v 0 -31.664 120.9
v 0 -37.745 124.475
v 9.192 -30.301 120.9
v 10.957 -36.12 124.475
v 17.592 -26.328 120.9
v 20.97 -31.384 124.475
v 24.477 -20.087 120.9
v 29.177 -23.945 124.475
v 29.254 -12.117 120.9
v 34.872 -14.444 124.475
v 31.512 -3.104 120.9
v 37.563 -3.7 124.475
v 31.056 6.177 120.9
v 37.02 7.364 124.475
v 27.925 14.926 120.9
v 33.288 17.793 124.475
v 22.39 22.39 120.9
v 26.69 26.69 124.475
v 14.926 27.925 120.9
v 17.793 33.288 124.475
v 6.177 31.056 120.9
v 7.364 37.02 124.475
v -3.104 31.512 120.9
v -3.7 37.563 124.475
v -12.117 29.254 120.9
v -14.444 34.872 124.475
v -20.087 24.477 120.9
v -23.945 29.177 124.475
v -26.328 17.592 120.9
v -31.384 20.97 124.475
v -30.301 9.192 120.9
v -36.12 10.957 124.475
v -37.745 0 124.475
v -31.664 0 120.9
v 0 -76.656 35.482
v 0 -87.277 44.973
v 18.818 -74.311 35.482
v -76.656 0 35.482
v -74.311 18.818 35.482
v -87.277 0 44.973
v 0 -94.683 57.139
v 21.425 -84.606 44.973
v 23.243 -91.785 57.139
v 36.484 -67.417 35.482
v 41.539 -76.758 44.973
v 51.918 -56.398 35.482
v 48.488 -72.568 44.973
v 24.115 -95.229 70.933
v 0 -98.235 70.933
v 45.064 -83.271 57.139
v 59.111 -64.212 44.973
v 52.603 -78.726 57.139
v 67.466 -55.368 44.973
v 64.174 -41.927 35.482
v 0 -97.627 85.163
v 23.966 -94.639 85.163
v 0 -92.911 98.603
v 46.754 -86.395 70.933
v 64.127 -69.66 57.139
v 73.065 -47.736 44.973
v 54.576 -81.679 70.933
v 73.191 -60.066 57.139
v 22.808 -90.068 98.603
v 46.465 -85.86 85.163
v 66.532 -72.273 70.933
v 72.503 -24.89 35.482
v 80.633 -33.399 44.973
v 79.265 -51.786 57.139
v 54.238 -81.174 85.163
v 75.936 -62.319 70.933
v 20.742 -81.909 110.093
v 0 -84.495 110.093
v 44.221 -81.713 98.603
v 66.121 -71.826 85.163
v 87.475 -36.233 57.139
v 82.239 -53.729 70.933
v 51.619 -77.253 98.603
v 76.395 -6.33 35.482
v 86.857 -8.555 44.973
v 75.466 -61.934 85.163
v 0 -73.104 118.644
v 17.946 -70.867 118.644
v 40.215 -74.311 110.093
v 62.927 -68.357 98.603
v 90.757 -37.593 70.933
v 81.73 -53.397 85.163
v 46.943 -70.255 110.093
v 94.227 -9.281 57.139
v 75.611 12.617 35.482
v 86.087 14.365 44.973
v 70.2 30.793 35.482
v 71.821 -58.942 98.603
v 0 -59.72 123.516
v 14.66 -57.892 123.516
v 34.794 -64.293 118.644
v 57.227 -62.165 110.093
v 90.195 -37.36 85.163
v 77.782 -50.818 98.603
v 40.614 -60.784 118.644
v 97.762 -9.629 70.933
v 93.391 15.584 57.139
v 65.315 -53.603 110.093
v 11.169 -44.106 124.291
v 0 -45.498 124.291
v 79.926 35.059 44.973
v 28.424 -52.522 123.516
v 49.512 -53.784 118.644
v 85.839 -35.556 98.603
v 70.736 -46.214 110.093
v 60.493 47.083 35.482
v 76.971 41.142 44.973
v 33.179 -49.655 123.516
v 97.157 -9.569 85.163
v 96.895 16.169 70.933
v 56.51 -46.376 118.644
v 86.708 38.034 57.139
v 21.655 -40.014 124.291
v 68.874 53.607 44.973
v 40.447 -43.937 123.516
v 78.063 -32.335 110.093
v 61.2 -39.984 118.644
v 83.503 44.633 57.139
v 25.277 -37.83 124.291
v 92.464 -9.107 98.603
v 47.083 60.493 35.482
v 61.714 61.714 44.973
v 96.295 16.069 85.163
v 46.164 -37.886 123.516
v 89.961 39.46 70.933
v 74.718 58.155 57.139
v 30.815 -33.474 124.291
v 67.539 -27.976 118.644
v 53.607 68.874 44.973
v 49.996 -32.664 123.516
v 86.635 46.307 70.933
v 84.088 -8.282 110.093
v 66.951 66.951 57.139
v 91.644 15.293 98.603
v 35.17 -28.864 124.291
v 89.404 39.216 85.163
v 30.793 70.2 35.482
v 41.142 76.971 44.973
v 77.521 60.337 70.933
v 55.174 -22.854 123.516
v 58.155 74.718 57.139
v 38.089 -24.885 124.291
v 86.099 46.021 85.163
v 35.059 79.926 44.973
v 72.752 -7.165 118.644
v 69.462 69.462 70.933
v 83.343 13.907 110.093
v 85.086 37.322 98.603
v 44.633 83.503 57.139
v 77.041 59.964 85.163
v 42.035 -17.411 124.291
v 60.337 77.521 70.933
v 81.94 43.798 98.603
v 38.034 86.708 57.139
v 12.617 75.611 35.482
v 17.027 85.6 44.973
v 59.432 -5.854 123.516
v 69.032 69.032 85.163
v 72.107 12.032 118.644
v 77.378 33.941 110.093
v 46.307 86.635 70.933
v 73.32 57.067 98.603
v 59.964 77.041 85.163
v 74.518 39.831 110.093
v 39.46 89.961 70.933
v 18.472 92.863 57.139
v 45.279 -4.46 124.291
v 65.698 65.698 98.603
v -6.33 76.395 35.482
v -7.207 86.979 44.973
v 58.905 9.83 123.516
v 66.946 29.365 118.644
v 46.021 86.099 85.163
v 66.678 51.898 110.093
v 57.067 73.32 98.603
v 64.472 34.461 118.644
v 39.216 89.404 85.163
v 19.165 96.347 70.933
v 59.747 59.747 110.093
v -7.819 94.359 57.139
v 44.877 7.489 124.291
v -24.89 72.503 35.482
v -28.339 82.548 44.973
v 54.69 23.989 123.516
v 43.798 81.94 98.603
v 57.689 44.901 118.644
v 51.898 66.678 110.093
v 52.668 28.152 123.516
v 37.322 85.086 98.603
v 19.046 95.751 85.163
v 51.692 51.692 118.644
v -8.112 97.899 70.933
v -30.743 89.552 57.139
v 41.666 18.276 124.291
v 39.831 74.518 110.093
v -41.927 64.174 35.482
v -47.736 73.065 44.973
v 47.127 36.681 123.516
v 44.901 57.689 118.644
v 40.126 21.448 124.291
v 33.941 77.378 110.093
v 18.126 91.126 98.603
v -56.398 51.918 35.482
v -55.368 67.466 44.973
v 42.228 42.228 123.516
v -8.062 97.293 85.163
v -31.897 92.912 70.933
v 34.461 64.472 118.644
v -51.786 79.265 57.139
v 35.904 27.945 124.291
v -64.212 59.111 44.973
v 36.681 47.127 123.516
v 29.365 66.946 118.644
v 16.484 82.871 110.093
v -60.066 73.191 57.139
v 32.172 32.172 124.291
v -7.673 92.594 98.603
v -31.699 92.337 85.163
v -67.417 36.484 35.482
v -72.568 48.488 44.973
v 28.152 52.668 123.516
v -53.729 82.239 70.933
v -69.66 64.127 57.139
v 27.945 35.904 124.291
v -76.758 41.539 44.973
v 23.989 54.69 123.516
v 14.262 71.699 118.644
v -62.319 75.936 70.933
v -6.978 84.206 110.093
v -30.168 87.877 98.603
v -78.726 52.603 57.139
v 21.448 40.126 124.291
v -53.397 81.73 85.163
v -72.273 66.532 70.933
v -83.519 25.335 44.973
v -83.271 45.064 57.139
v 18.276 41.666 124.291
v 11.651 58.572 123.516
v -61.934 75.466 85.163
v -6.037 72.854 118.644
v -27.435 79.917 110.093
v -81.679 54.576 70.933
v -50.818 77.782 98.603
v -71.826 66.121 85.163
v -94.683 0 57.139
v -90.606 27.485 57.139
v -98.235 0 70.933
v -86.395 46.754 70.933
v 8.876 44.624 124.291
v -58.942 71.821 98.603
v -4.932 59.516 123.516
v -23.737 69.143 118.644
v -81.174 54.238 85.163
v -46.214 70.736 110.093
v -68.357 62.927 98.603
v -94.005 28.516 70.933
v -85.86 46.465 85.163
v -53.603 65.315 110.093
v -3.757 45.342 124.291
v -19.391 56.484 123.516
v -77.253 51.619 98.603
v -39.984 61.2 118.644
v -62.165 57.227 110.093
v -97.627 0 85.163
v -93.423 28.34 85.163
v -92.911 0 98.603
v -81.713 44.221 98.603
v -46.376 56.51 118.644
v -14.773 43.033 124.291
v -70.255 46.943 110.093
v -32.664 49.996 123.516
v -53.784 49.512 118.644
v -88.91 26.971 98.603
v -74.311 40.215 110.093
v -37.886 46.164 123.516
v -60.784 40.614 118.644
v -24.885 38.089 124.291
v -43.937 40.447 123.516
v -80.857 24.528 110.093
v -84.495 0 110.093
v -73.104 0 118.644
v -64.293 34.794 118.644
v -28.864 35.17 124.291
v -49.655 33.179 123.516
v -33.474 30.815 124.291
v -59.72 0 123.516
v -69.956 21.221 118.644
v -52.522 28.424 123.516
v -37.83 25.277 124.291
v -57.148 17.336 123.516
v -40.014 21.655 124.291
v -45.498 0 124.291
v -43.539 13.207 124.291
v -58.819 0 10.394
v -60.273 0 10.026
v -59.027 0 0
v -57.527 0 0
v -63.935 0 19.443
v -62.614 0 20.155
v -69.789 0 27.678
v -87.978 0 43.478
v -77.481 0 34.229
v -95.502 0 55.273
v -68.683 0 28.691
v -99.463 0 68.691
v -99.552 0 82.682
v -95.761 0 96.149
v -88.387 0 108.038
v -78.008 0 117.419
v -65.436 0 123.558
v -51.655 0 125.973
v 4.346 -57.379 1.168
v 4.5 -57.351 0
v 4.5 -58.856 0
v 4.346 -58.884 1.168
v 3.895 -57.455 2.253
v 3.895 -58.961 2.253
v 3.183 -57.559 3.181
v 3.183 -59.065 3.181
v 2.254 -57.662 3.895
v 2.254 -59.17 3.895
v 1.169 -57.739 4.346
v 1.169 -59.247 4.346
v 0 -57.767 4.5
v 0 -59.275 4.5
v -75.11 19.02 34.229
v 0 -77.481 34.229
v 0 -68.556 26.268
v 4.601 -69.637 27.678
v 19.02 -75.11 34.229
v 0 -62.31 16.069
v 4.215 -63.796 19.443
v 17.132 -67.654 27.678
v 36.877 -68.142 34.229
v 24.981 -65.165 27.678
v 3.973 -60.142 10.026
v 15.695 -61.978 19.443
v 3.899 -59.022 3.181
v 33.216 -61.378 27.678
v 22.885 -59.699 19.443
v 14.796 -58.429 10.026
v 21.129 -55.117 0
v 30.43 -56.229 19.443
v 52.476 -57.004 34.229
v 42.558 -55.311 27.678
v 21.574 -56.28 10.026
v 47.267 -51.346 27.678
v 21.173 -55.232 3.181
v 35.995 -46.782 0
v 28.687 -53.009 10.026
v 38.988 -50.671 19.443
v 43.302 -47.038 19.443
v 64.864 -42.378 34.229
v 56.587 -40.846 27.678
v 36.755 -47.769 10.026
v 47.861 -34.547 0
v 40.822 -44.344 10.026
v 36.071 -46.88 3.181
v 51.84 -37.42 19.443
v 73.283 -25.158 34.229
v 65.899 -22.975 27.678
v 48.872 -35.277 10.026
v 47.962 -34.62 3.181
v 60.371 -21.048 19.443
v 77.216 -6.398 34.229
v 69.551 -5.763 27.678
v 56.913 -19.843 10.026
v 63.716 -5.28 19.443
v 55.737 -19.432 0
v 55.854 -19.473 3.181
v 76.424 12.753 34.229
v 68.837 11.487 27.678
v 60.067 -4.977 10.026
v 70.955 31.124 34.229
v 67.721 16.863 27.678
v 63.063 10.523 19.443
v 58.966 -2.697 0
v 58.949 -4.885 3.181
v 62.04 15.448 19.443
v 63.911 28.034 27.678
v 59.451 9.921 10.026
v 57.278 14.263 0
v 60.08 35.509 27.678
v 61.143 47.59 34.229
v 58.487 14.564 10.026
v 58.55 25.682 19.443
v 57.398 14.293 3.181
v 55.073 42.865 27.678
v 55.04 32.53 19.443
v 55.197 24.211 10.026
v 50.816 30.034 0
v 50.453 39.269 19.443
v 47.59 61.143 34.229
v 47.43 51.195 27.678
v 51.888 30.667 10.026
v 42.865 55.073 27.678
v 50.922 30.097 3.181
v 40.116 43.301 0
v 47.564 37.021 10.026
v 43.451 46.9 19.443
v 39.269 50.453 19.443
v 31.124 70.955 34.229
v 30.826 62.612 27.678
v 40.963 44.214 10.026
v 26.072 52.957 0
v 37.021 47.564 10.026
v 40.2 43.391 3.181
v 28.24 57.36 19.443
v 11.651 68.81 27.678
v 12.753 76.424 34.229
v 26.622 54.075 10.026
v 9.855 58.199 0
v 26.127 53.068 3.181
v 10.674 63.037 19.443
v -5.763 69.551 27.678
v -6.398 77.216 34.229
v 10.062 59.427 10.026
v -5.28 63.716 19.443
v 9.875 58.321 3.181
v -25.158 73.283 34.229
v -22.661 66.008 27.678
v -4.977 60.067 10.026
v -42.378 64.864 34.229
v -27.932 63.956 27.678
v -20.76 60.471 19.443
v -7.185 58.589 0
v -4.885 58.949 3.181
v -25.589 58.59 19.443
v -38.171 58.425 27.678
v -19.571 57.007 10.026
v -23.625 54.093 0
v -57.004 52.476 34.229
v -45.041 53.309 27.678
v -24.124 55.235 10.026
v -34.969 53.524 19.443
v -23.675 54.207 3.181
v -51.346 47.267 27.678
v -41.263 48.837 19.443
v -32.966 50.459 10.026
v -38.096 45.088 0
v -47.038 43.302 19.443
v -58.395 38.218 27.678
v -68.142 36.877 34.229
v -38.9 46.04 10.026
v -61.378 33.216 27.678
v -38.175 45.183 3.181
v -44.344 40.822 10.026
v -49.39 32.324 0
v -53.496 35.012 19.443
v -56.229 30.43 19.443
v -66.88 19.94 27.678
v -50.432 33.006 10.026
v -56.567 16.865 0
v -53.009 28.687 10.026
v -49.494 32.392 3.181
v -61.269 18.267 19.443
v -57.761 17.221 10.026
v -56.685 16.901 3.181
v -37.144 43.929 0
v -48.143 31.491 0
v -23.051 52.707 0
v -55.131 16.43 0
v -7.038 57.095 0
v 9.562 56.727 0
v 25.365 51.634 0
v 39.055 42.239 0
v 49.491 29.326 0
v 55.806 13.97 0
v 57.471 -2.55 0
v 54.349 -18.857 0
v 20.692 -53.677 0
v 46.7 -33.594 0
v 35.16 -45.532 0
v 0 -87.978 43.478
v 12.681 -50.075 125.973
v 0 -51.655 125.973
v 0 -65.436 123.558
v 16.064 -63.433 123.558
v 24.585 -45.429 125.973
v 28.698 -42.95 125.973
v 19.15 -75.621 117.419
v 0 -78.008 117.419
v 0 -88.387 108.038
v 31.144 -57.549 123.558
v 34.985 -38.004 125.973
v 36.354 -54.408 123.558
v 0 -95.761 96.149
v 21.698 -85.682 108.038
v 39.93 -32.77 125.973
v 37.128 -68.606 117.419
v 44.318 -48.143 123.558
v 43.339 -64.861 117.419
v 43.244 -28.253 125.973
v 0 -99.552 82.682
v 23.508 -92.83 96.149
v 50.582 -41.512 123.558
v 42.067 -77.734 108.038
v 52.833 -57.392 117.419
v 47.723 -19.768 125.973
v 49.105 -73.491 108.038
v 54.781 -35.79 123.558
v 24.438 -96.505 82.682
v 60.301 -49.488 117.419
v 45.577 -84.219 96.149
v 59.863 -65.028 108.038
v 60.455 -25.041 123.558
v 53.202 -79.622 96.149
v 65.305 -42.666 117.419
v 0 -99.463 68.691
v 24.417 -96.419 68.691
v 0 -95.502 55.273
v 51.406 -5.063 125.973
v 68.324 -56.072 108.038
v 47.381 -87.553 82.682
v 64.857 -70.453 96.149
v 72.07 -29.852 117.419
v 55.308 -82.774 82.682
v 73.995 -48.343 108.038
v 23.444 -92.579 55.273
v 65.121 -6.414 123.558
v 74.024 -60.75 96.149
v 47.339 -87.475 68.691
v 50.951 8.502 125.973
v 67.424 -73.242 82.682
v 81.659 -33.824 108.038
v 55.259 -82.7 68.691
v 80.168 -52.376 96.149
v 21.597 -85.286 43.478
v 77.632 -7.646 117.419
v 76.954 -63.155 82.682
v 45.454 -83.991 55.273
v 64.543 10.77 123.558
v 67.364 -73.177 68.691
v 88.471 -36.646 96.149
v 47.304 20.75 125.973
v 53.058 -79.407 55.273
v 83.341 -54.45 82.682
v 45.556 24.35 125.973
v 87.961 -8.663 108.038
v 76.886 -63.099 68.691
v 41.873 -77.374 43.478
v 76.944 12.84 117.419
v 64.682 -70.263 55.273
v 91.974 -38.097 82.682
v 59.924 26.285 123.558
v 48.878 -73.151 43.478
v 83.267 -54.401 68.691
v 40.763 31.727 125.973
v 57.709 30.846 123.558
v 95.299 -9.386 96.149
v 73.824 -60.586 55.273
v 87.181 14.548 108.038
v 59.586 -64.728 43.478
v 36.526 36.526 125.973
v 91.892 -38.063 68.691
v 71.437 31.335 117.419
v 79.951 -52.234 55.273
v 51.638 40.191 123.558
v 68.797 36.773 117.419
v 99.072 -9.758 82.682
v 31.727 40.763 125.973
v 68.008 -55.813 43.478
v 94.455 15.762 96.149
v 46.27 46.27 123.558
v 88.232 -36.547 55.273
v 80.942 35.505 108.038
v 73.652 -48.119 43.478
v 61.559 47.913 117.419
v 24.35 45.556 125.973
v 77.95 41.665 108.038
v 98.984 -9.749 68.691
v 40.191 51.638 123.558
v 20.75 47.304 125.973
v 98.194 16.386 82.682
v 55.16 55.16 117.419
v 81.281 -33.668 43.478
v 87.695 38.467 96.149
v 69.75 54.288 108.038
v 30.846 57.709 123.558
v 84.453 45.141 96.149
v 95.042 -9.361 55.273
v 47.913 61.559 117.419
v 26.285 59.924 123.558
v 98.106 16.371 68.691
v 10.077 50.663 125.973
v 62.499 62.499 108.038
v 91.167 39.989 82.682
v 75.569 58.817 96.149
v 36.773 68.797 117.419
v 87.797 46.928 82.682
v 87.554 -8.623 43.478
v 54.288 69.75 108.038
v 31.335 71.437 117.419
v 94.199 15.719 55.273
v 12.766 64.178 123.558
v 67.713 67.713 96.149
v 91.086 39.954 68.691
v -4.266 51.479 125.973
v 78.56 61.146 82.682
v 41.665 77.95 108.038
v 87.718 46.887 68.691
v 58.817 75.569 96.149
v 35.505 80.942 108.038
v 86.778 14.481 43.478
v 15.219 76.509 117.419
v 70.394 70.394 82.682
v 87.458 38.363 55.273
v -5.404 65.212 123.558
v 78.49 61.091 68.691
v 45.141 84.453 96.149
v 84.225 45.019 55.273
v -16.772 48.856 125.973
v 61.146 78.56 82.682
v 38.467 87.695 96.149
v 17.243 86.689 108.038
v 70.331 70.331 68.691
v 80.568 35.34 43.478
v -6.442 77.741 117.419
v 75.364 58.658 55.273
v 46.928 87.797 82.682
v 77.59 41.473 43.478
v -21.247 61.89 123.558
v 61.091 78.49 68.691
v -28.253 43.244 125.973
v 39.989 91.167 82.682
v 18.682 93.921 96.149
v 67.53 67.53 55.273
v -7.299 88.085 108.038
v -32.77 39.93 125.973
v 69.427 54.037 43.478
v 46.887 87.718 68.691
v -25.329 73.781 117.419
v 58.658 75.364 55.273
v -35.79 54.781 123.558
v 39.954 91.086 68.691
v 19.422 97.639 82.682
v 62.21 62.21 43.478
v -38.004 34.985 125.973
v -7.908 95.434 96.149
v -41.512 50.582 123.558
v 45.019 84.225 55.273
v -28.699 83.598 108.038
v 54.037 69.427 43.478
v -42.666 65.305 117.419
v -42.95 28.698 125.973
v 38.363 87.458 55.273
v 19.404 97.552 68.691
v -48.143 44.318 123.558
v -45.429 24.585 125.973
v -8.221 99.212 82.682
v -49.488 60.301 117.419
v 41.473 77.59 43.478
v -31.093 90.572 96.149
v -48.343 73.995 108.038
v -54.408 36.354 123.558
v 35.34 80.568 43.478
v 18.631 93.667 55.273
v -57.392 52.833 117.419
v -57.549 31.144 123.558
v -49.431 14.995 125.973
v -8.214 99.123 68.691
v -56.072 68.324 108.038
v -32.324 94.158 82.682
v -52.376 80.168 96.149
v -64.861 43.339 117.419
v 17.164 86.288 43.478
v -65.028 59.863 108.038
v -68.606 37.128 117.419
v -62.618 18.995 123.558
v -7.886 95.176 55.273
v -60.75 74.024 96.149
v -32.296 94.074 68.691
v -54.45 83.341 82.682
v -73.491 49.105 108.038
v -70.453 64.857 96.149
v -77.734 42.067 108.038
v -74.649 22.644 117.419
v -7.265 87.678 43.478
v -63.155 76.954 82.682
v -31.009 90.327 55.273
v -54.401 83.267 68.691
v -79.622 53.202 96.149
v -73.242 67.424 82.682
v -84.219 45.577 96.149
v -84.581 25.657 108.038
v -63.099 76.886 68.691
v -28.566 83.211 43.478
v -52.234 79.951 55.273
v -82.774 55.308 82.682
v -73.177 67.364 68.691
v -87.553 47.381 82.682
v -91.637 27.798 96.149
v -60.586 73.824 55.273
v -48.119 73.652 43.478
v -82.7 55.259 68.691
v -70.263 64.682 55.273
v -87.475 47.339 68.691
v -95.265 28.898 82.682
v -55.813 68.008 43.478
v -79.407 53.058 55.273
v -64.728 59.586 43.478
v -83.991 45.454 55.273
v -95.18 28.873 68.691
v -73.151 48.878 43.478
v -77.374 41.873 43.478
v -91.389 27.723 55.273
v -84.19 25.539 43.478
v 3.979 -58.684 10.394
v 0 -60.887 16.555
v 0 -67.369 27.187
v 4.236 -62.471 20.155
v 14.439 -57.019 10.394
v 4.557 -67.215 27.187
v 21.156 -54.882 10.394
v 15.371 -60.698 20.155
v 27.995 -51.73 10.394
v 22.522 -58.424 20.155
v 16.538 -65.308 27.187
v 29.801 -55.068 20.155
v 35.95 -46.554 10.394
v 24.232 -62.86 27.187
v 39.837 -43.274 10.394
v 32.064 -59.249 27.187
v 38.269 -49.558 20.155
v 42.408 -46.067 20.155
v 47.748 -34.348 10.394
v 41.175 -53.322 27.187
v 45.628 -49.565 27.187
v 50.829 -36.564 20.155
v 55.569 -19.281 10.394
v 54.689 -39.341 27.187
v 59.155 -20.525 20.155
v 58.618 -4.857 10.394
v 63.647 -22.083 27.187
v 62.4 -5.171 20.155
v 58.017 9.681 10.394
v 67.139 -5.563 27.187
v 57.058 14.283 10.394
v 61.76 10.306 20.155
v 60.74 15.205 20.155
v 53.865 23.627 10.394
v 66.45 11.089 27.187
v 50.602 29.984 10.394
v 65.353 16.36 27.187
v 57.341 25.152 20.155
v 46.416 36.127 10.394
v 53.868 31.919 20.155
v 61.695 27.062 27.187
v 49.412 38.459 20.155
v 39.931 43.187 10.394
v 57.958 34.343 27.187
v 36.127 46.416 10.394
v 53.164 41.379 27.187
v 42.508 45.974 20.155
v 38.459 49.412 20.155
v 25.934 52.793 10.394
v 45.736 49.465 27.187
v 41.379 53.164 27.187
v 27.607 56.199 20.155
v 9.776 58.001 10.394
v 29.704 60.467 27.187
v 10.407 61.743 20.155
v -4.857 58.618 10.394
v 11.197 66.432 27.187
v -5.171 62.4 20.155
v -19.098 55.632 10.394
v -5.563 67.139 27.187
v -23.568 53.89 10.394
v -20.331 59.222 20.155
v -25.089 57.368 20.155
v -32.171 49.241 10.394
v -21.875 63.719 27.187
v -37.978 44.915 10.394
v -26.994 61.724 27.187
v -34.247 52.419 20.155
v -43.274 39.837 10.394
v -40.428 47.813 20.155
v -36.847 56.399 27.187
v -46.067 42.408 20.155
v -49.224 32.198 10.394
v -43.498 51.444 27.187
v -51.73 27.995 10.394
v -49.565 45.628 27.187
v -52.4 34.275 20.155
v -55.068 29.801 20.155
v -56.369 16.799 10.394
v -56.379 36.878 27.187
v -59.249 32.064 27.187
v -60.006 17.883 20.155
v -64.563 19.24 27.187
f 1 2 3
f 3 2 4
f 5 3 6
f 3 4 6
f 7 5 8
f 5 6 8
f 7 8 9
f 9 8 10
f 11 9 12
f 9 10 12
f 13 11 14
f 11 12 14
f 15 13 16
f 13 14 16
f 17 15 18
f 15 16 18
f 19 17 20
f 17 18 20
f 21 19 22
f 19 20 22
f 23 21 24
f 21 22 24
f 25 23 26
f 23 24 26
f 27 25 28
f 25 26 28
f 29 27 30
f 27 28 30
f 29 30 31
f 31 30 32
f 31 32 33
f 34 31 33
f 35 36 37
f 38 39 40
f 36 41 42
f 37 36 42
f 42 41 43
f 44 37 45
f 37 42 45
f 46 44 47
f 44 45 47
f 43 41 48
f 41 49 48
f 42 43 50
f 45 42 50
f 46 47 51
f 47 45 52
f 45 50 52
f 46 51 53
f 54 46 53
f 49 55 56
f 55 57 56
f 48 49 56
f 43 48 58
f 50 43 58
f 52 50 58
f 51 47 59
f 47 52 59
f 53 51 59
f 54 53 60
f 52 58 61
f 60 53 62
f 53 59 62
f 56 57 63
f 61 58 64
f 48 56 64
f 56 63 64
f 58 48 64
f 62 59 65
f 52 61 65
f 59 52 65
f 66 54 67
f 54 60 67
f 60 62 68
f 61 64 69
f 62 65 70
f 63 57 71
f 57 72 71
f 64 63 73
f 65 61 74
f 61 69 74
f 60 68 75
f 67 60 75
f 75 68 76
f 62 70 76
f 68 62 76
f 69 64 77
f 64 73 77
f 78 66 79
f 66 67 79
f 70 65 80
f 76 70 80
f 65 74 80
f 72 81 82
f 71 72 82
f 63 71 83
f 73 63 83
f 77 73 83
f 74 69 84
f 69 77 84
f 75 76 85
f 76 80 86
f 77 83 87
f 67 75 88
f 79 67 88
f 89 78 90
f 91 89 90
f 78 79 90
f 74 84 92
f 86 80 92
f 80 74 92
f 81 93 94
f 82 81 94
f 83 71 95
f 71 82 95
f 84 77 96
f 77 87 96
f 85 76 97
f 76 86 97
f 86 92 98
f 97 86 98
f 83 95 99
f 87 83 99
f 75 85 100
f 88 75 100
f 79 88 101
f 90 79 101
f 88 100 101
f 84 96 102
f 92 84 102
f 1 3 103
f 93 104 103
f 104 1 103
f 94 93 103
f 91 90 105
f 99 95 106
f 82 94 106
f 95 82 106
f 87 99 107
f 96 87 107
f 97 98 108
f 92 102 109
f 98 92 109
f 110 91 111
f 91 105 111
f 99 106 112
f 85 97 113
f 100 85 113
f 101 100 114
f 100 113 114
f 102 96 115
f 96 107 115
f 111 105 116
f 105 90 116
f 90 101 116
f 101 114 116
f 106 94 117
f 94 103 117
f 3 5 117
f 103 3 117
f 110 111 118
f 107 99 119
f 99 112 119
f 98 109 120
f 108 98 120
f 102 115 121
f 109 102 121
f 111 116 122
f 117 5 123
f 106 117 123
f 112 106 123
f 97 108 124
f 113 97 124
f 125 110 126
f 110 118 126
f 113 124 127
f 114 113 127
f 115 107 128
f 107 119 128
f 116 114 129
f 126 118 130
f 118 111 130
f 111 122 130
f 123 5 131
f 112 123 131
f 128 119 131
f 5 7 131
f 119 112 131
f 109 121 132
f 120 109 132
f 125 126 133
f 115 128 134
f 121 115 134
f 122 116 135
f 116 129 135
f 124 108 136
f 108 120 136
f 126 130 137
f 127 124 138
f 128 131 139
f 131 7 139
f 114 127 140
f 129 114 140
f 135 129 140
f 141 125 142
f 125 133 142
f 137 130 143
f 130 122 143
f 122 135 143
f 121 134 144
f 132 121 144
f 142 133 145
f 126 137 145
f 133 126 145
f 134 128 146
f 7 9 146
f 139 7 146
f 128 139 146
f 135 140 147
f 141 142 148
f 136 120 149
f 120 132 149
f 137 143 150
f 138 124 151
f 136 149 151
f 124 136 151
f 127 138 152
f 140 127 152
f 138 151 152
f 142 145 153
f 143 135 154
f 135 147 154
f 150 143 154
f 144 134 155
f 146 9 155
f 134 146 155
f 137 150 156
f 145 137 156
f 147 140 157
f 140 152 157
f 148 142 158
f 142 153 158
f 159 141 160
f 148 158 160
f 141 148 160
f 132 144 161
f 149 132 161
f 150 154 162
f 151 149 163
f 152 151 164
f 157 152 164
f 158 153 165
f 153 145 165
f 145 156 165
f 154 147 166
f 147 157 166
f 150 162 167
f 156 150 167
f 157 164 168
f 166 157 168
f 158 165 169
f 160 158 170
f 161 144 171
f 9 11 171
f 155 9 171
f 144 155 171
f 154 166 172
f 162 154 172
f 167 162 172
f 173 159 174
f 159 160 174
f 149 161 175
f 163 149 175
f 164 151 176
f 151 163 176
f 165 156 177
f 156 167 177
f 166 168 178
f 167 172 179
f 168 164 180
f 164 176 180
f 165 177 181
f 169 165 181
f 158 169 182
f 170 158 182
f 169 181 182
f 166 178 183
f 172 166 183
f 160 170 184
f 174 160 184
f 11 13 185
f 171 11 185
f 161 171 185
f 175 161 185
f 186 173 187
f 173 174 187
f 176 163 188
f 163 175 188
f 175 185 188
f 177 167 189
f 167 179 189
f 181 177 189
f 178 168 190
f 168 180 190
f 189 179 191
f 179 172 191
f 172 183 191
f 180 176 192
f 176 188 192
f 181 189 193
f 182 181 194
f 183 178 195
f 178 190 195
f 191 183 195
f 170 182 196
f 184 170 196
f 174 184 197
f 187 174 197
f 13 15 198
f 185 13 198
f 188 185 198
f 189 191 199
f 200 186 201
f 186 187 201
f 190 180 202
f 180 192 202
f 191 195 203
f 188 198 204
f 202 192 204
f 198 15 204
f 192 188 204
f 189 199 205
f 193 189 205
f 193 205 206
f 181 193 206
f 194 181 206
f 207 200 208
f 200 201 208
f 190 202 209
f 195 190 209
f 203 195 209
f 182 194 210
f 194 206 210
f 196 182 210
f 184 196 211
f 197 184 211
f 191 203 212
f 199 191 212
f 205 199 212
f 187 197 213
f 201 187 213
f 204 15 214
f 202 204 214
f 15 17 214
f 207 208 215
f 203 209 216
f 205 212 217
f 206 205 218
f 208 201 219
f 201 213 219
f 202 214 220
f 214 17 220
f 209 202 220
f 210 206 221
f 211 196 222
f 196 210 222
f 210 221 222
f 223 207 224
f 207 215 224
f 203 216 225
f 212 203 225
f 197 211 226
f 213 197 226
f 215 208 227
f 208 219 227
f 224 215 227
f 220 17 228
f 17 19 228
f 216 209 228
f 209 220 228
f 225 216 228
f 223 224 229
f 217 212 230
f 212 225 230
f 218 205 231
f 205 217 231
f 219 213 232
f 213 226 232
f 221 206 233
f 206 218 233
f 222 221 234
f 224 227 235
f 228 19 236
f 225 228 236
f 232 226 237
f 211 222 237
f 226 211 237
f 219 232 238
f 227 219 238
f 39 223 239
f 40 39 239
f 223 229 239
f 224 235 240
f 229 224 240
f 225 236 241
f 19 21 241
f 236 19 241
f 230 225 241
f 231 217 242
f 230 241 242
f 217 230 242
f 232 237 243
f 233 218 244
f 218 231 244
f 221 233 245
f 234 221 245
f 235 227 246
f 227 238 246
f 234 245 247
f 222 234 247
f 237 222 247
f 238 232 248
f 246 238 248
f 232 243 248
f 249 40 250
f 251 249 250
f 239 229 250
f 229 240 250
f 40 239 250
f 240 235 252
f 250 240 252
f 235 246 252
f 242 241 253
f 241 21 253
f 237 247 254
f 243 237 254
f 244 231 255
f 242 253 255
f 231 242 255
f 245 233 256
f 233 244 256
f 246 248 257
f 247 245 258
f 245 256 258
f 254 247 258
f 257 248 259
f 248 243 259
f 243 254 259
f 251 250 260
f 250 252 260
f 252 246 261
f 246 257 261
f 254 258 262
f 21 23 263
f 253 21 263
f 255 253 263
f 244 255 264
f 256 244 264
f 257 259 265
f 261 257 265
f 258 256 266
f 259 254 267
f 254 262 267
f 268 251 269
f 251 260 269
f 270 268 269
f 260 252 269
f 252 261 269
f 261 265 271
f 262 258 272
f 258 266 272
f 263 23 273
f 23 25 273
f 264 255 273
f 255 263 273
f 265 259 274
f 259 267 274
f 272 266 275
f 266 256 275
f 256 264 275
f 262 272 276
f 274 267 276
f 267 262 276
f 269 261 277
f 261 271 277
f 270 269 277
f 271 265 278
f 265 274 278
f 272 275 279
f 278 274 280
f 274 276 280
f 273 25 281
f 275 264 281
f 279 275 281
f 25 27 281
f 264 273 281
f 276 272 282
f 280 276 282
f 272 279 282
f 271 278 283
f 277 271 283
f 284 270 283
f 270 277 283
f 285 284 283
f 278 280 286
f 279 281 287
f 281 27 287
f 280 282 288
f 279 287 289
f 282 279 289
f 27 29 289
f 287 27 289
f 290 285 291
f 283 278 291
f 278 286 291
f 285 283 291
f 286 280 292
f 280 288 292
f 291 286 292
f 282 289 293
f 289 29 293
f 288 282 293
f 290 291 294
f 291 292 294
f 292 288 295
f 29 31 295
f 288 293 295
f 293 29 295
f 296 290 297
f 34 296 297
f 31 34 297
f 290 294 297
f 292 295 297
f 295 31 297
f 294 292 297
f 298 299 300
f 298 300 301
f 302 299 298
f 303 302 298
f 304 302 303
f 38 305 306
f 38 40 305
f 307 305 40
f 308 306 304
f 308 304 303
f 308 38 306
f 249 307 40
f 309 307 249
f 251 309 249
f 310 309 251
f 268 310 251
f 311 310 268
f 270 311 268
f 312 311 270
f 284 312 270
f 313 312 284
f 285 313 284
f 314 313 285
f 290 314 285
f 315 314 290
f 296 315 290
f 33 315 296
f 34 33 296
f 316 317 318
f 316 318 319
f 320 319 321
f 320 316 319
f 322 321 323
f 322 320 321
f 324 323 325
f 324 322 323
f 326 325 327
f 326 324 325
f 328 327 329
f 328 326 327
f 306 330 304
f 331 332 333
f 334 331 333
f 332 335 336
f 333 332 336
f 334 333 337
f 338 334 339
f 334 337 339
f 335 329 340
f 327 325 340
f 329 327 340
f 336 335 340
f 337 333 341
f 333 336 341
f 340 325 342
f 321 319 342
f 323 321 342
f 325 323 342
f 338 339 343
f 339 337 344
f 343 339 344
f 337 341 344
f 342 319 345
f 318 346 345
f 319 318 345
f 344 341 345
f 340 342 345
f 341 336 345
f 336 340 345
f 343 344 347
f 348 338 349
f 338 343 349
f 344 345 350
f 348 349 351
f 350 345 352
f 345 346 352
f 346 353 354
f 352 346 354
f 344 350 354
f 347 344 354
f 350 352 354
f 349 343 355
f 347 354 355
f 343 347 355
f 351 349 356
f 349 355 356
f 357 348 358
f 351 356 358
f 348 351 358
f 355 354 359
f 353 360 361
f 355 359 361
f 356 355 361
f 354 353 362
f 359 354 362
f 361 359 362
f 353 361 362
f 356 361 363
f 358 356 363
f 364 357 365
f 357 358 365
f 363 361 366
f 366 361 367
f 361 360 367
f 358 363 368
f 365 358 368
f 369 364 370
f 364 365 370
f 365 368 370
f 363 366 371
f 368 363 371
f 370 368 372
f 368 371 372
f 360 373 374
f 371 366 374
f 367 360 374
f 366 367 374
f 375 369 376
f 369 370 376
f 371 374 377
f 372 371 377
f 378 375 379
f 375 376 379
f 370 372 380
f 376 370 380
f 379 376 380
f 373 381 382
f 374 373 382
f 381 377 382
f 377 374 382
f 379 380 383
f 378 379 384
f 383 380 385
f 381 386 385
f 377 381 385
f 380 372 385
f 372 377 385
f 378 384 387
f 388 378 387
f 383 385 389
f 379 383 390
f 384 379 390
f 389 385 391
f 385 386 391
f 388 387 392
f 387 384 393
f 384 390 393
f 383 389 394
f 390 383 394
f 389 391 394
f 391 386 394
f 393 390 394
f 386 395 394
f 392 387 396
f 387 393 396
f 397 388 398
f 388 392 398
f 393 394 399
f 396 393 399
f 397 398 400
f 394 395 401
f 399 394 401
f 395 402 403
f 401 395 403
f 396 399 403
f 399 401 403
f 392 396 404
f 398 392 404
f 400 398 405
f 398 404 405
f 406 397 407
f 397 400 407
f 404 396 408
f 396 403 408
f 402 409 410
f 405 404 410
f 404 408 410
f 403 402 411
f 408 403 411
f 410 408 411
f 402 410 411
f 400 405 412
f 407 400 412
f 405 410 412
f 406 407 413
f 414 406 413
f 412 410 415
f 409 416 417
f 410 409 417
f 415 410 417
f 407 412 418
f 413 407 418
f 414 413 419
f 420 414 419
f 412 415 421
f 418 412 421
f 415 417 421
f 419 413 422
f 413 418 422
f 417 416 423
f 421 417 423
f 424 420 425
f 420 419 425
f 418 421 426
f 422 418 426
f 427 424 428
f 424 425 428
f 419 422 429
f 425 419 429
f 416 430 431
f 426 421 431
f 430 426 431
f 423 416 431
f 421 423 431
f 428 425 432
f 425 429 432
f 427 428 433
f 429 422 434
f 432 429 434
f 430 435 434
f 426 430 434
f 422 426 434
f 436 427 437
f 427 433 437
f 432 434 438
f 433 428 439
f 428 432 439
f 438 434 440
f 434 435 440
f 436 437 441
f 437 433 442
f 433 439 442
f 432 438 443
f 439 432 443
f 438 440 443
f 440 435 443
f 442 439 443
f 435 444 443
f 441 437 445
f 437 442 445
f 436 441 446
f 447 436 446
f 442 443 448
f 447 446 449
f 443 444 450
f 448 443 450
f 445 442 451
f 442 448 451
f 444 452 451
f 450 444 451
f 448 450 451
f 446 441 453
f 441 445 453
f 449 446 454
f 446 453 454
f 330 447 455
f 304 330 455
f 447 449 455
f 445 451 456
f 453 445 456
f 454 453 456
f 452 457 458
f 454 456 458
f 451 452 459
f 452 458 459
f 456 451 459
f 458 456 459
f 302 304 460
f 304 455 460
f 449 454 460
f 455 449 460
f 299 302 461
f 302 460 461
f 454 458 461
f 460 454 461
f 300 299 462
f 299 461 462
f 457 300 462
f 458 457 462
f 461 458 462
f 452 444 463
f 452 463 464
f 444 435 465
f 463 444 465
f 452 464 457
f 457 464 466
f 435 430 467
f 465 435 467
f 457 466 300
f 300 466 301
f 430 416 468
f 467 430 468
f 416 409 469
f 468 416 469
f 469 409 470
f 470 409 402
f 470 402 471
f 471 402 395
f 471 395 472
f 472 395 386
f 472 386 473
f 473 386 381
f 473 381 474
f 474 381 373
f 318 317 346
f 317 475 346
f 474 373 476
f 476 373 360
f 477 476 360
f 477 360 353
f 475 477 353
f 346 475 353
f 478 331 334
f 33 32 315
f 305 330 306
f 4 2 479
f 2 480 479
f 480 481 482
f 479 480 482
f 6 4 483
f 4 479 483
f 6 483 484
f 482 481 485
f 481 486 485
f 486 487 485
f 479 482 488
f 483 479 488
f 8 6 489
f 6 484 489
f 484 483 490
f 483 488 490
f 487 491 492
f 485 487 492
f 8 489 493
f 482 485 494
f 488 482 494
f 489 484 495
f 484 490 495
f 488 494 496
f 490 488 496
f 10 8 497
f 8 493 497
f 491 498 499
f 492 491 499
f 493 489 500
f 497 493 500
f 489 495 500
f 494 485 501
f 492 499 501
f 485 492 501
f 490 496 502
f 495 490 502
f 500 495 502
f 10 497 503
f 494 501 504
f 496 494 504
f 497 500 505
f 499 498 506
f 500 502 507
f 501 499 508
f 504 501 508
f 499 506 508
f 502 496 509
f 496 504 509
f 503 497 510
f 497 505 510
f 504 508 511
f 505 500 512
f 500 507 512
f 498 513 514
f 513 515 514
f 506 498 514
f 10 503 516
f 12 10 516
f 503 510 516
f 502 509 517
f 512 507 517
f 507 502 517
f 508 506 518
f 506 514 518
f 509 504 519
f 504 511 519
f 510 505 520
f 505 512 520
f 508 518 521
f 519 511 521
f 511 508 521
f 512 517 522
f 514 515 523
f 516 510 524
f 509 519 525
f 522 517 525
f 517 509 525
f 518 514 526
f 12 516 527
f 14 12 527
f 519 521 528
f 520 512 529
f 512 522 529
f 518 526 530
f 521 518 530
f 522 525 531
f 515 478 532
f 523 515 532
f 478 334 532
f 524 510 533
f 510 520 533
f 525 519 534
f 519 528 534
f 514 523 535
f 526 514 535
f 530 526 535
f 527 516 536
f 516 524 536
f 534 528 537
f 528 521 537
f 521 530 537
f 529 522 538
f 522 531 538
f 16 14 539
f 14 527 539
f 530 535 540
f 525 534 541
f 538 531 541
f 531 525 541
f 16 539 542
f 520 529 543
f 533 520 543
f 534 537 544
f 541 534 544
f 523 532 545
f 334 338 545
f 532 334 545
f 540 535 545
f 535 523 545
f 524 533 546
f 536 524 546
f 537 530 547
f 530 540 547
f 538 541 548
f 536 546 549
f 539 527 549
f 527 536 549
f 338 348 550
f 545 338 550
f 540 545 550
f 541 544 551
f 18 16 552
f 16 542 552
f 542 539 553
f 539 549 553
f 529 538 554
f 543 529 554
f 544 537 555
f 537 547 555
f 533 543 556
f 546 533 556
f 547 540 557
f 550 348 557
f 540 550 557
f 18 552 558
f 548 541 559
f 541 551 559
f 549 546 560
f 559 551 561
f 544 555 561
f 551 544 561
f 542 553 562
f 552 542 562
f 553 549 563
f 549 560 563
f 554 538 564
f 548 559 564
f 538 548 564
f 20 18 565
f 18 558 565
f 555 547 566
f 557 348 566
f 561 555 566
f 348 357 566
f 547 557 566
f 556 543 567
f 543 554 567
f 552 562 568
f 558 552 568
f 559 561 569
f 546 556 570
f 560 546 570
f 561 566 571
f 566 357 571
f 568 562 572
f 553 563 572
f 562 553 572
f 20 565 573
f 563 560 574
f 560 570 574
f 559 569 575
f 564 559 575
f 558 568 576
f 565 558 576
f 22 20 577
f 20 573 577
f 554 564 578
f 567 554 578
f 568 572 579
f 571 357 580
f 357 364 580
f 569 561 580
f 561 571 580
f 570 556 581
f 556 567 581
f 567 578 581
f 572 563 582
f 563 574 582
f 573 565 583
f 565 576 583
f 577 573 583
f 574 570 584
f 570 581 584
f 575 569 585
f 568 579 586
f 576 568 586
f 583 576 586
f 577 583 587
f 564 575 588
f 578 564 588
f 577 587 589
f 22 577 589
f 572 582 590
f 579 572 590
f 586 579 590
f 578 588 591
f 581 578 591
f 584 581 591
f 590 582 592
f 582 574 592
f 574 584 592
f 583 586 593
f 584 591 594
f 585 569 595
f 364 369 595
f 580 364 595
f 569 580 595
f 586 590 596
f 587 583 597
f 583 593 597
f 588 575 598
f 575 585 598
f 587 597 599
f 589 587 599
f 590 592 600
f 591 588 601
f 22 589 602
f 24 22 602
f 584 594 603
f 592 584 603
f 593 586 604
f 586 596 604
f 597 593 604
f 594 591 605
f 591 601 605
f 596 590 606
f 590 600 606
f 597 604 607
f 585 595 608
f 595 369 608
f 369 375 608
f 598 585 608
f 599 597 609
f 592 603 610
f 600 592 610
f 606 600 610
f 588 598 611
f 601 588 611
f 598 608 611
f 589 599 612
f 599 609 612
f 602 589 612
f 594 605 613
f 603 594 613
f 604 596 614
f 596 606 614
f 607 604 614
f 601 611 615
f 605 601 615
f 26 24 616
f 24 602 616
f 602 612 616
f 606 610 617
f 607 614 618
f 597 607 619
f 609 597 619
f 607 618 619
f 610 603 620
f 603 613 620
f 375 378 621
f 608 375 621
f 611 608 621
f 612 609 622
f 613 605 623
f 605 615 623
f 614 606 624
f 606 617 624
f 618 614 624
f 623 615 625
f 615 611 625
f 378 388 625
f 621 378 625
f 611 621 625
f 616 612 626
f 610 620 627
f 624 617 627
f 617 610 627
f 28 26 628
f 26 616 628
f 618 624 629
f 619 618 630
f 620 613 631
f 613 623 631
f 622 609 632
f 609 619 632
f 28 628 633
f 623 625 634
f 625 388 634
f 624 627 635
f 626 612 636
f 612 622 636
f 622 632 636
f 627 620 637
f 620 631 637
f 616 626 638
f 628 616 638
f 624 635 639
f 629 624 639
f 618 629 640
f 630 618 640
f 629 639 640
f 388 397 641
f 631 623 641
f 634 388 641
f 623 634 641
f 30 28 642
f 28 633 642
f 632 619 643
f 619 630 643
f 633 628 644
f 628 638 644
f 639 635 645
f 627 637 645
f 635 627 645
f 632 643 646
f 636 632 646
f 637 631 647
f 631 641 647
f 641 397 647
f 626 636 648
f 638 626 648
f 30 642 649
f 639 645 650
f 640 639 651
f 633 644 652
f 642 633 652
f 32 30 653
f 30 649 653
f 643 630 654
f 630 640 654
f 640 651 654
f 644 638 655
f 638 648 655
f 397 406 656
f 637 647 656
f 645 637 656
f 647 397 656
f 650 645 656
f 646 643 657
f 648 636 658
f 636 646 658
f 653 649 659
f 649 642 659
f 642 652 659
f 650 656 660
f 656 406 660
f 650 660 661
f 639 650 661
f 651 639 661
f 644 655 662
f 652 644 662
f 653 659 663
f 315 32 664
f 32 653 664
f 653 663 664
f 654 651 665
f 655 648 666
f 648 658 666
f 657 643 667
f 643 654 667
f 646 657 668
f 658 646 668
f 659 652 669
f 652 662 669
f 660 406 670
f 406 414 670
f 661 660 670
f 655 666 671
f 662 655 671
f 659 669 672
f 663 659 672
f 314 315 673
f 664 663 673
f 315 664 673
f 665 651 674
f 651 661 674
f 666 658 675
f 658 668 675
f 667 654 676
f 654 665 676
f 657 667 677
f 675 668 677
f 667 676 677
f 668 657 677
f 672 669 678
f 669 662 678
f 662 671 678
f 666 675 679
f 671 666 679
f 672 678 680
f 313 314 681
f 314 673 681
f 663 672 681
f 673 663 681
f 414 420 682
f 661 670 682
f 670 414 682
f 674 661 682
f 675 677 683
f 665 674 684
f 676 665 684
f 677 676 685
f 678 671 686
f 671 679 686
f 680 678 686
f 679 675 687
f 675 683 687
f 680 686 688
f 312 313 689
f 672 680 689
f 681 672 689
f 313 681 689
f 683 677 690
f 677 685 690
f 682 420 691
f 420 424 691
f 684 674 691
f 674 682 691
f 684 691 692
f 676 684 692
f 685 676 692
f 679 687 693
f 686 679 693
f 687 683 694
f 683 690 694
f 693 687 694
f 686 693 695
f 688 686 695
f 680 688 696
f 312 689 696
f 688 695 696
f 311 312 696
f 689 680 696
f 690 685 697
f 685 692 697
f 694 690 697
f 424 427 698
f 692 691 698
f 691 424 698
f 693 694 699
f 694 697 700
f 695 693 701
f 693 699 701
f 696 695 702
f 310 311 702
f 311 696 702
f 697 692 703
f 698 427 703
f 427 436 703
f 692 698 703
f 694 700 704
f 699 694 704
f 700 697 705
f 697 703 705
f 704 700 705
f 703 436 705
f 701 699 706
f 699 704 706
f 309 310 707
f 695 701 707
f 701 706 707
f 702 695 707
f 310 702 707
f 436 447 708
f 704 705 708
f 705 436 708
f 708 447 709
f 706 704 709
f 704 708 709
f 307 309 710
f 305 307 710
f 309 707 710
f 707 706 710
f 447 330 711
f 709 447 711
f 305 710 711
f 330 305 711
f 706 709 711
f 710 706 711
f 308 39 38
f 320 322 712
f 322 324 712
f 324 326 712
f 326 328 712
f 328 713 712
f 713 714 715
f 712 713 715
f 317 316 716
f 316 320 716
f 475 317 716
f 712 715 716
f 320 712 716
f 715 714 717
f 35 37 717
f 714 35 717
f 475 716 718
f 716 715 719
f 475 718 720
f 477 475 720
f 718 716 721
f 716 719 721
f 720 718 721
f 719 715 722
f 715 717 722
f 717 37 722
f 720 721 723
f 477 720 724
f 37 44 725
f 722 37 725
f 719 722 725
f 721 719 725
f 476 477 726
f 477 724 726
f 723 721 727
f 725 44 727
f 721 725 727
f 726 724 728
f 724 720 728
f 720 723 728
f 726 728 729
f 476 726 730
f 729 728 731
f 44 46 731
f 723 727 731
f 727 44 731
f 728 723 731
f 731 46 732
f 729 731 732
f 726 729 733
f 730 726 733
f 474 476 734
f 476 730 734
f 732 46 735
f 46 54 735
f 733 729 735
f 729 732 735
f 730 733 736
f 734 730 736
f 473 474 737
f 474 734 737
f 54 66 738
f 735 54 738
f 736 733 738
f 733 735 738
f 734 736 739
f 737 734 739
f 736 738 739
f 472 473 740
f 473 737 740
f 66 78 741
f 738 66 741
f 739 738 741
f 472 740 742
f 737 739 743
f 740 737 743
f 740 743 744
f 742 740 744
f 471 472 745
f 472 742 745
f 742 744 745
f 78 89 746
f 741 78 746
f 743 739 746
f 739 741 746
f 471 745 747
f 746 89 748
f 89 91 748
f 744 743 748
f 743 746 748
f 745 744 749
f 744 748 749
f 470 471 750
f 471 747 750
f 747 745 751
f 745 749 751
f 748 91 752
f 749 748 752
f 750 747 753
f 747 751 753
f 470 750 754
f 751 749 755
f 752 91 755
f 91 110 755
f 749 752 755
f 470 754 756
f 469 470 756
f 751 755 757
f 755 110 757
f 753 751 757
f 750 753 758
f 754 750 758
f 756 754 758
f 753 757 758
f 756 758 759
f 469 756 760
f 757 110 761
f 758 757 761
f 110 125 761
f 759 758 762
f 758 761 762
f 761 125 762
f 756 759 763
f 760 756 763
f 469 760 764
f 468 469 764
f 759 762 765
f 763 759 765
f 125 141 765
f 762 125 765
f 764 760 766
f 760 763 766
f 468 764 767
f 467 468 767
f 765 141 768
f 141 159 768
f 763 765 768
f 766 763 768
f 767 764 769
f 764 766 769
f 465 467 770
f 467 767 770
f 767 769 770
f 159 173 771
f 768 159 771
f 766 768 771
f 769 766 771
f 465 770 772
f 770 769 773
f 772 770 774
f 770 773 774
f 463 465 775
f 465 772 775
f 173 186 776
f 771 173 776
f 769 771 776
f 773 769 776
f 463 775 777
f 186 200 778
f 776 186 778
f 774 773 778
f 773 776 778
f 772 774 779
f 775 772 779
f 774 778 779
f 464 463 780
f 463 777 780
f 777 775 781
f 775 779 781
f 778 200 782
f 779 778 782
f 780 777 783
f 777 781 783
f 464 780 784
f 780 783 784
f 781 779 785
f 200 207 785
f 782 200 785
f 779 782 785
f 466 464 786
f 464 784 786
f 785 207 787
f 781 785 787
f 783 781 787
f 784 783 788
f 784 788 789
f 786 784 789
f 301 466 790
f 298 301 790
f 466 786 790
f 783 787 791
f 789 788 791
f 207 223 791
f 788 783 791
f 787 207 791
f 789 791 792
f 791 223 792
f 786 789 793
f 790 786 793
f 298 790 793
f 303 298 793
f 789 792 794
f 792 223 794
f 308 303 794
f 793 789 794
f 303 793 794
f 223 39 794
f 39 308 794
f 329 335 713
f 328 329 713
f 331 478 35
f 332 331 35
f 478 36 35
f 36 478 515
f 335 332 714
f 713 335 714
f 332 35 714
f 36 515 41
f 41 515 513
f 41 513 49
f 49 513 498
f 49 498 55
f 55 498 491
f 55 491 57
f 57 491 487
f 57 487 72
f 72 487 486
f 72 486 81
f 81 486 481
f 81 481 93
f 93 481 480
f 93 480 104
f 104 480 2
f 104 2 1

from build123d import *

# Parameters (mm, degrees)
F1_ANGLE = 270
F3_DEPTH = 100.001


# Not quite as in the source:
# - a feature names something its author has since deleted; it is built from what else it names


with BuildPart() as f1:
    # F0 (on Right) → F1 (revolve)
    with BuildSketch(Plane.YZ):
        with BuildLine():
            ThreePointArc((-76.6564003216, 35.4822715112), (-92.9111910846, 98.6026476259), (-31.6640544802, 120.9003686165))
            Line((-31.6640544802, 120.9003686165), (-37.7450487886, 124.4749024837))
            ThreePointArc((-37.7450487886, 124.4749024837), (-95.7605829794, 96.1486735392), (-77.4808250738, 34.2291458878))
            ThreePointArc((-77.4808250738, 34.2291458878), (-63.9346767138, 19.4432539414), (-59.0274766756, 0))
            Line((-59.0274766756, 0), (-57.5274766756, 0))
            ThreePointArc((-57.5274766756, 0), (-62.6143288187, 20.1550695325), (-76.6564003216, 35.4822715112))
        make_face()
    revolve(axis=Axis((0, 0, 76), (0, 0, 1)), revolution_arc=F1_ANGLE)

    # F2 (on Front) → F3 (cut, through all)
    with BuildSketch(Plane.XZ):
        with BuildLine():
            Line((-4.5, 0), (4.5, 0))
            ThreePointArc((4.5, 0), (0, 4.5), (-4.5, 0))
        make_face()
    extrude(amount=F3_DEPTH, mode=Mode.SUBTRACT)


solid = f1.part
